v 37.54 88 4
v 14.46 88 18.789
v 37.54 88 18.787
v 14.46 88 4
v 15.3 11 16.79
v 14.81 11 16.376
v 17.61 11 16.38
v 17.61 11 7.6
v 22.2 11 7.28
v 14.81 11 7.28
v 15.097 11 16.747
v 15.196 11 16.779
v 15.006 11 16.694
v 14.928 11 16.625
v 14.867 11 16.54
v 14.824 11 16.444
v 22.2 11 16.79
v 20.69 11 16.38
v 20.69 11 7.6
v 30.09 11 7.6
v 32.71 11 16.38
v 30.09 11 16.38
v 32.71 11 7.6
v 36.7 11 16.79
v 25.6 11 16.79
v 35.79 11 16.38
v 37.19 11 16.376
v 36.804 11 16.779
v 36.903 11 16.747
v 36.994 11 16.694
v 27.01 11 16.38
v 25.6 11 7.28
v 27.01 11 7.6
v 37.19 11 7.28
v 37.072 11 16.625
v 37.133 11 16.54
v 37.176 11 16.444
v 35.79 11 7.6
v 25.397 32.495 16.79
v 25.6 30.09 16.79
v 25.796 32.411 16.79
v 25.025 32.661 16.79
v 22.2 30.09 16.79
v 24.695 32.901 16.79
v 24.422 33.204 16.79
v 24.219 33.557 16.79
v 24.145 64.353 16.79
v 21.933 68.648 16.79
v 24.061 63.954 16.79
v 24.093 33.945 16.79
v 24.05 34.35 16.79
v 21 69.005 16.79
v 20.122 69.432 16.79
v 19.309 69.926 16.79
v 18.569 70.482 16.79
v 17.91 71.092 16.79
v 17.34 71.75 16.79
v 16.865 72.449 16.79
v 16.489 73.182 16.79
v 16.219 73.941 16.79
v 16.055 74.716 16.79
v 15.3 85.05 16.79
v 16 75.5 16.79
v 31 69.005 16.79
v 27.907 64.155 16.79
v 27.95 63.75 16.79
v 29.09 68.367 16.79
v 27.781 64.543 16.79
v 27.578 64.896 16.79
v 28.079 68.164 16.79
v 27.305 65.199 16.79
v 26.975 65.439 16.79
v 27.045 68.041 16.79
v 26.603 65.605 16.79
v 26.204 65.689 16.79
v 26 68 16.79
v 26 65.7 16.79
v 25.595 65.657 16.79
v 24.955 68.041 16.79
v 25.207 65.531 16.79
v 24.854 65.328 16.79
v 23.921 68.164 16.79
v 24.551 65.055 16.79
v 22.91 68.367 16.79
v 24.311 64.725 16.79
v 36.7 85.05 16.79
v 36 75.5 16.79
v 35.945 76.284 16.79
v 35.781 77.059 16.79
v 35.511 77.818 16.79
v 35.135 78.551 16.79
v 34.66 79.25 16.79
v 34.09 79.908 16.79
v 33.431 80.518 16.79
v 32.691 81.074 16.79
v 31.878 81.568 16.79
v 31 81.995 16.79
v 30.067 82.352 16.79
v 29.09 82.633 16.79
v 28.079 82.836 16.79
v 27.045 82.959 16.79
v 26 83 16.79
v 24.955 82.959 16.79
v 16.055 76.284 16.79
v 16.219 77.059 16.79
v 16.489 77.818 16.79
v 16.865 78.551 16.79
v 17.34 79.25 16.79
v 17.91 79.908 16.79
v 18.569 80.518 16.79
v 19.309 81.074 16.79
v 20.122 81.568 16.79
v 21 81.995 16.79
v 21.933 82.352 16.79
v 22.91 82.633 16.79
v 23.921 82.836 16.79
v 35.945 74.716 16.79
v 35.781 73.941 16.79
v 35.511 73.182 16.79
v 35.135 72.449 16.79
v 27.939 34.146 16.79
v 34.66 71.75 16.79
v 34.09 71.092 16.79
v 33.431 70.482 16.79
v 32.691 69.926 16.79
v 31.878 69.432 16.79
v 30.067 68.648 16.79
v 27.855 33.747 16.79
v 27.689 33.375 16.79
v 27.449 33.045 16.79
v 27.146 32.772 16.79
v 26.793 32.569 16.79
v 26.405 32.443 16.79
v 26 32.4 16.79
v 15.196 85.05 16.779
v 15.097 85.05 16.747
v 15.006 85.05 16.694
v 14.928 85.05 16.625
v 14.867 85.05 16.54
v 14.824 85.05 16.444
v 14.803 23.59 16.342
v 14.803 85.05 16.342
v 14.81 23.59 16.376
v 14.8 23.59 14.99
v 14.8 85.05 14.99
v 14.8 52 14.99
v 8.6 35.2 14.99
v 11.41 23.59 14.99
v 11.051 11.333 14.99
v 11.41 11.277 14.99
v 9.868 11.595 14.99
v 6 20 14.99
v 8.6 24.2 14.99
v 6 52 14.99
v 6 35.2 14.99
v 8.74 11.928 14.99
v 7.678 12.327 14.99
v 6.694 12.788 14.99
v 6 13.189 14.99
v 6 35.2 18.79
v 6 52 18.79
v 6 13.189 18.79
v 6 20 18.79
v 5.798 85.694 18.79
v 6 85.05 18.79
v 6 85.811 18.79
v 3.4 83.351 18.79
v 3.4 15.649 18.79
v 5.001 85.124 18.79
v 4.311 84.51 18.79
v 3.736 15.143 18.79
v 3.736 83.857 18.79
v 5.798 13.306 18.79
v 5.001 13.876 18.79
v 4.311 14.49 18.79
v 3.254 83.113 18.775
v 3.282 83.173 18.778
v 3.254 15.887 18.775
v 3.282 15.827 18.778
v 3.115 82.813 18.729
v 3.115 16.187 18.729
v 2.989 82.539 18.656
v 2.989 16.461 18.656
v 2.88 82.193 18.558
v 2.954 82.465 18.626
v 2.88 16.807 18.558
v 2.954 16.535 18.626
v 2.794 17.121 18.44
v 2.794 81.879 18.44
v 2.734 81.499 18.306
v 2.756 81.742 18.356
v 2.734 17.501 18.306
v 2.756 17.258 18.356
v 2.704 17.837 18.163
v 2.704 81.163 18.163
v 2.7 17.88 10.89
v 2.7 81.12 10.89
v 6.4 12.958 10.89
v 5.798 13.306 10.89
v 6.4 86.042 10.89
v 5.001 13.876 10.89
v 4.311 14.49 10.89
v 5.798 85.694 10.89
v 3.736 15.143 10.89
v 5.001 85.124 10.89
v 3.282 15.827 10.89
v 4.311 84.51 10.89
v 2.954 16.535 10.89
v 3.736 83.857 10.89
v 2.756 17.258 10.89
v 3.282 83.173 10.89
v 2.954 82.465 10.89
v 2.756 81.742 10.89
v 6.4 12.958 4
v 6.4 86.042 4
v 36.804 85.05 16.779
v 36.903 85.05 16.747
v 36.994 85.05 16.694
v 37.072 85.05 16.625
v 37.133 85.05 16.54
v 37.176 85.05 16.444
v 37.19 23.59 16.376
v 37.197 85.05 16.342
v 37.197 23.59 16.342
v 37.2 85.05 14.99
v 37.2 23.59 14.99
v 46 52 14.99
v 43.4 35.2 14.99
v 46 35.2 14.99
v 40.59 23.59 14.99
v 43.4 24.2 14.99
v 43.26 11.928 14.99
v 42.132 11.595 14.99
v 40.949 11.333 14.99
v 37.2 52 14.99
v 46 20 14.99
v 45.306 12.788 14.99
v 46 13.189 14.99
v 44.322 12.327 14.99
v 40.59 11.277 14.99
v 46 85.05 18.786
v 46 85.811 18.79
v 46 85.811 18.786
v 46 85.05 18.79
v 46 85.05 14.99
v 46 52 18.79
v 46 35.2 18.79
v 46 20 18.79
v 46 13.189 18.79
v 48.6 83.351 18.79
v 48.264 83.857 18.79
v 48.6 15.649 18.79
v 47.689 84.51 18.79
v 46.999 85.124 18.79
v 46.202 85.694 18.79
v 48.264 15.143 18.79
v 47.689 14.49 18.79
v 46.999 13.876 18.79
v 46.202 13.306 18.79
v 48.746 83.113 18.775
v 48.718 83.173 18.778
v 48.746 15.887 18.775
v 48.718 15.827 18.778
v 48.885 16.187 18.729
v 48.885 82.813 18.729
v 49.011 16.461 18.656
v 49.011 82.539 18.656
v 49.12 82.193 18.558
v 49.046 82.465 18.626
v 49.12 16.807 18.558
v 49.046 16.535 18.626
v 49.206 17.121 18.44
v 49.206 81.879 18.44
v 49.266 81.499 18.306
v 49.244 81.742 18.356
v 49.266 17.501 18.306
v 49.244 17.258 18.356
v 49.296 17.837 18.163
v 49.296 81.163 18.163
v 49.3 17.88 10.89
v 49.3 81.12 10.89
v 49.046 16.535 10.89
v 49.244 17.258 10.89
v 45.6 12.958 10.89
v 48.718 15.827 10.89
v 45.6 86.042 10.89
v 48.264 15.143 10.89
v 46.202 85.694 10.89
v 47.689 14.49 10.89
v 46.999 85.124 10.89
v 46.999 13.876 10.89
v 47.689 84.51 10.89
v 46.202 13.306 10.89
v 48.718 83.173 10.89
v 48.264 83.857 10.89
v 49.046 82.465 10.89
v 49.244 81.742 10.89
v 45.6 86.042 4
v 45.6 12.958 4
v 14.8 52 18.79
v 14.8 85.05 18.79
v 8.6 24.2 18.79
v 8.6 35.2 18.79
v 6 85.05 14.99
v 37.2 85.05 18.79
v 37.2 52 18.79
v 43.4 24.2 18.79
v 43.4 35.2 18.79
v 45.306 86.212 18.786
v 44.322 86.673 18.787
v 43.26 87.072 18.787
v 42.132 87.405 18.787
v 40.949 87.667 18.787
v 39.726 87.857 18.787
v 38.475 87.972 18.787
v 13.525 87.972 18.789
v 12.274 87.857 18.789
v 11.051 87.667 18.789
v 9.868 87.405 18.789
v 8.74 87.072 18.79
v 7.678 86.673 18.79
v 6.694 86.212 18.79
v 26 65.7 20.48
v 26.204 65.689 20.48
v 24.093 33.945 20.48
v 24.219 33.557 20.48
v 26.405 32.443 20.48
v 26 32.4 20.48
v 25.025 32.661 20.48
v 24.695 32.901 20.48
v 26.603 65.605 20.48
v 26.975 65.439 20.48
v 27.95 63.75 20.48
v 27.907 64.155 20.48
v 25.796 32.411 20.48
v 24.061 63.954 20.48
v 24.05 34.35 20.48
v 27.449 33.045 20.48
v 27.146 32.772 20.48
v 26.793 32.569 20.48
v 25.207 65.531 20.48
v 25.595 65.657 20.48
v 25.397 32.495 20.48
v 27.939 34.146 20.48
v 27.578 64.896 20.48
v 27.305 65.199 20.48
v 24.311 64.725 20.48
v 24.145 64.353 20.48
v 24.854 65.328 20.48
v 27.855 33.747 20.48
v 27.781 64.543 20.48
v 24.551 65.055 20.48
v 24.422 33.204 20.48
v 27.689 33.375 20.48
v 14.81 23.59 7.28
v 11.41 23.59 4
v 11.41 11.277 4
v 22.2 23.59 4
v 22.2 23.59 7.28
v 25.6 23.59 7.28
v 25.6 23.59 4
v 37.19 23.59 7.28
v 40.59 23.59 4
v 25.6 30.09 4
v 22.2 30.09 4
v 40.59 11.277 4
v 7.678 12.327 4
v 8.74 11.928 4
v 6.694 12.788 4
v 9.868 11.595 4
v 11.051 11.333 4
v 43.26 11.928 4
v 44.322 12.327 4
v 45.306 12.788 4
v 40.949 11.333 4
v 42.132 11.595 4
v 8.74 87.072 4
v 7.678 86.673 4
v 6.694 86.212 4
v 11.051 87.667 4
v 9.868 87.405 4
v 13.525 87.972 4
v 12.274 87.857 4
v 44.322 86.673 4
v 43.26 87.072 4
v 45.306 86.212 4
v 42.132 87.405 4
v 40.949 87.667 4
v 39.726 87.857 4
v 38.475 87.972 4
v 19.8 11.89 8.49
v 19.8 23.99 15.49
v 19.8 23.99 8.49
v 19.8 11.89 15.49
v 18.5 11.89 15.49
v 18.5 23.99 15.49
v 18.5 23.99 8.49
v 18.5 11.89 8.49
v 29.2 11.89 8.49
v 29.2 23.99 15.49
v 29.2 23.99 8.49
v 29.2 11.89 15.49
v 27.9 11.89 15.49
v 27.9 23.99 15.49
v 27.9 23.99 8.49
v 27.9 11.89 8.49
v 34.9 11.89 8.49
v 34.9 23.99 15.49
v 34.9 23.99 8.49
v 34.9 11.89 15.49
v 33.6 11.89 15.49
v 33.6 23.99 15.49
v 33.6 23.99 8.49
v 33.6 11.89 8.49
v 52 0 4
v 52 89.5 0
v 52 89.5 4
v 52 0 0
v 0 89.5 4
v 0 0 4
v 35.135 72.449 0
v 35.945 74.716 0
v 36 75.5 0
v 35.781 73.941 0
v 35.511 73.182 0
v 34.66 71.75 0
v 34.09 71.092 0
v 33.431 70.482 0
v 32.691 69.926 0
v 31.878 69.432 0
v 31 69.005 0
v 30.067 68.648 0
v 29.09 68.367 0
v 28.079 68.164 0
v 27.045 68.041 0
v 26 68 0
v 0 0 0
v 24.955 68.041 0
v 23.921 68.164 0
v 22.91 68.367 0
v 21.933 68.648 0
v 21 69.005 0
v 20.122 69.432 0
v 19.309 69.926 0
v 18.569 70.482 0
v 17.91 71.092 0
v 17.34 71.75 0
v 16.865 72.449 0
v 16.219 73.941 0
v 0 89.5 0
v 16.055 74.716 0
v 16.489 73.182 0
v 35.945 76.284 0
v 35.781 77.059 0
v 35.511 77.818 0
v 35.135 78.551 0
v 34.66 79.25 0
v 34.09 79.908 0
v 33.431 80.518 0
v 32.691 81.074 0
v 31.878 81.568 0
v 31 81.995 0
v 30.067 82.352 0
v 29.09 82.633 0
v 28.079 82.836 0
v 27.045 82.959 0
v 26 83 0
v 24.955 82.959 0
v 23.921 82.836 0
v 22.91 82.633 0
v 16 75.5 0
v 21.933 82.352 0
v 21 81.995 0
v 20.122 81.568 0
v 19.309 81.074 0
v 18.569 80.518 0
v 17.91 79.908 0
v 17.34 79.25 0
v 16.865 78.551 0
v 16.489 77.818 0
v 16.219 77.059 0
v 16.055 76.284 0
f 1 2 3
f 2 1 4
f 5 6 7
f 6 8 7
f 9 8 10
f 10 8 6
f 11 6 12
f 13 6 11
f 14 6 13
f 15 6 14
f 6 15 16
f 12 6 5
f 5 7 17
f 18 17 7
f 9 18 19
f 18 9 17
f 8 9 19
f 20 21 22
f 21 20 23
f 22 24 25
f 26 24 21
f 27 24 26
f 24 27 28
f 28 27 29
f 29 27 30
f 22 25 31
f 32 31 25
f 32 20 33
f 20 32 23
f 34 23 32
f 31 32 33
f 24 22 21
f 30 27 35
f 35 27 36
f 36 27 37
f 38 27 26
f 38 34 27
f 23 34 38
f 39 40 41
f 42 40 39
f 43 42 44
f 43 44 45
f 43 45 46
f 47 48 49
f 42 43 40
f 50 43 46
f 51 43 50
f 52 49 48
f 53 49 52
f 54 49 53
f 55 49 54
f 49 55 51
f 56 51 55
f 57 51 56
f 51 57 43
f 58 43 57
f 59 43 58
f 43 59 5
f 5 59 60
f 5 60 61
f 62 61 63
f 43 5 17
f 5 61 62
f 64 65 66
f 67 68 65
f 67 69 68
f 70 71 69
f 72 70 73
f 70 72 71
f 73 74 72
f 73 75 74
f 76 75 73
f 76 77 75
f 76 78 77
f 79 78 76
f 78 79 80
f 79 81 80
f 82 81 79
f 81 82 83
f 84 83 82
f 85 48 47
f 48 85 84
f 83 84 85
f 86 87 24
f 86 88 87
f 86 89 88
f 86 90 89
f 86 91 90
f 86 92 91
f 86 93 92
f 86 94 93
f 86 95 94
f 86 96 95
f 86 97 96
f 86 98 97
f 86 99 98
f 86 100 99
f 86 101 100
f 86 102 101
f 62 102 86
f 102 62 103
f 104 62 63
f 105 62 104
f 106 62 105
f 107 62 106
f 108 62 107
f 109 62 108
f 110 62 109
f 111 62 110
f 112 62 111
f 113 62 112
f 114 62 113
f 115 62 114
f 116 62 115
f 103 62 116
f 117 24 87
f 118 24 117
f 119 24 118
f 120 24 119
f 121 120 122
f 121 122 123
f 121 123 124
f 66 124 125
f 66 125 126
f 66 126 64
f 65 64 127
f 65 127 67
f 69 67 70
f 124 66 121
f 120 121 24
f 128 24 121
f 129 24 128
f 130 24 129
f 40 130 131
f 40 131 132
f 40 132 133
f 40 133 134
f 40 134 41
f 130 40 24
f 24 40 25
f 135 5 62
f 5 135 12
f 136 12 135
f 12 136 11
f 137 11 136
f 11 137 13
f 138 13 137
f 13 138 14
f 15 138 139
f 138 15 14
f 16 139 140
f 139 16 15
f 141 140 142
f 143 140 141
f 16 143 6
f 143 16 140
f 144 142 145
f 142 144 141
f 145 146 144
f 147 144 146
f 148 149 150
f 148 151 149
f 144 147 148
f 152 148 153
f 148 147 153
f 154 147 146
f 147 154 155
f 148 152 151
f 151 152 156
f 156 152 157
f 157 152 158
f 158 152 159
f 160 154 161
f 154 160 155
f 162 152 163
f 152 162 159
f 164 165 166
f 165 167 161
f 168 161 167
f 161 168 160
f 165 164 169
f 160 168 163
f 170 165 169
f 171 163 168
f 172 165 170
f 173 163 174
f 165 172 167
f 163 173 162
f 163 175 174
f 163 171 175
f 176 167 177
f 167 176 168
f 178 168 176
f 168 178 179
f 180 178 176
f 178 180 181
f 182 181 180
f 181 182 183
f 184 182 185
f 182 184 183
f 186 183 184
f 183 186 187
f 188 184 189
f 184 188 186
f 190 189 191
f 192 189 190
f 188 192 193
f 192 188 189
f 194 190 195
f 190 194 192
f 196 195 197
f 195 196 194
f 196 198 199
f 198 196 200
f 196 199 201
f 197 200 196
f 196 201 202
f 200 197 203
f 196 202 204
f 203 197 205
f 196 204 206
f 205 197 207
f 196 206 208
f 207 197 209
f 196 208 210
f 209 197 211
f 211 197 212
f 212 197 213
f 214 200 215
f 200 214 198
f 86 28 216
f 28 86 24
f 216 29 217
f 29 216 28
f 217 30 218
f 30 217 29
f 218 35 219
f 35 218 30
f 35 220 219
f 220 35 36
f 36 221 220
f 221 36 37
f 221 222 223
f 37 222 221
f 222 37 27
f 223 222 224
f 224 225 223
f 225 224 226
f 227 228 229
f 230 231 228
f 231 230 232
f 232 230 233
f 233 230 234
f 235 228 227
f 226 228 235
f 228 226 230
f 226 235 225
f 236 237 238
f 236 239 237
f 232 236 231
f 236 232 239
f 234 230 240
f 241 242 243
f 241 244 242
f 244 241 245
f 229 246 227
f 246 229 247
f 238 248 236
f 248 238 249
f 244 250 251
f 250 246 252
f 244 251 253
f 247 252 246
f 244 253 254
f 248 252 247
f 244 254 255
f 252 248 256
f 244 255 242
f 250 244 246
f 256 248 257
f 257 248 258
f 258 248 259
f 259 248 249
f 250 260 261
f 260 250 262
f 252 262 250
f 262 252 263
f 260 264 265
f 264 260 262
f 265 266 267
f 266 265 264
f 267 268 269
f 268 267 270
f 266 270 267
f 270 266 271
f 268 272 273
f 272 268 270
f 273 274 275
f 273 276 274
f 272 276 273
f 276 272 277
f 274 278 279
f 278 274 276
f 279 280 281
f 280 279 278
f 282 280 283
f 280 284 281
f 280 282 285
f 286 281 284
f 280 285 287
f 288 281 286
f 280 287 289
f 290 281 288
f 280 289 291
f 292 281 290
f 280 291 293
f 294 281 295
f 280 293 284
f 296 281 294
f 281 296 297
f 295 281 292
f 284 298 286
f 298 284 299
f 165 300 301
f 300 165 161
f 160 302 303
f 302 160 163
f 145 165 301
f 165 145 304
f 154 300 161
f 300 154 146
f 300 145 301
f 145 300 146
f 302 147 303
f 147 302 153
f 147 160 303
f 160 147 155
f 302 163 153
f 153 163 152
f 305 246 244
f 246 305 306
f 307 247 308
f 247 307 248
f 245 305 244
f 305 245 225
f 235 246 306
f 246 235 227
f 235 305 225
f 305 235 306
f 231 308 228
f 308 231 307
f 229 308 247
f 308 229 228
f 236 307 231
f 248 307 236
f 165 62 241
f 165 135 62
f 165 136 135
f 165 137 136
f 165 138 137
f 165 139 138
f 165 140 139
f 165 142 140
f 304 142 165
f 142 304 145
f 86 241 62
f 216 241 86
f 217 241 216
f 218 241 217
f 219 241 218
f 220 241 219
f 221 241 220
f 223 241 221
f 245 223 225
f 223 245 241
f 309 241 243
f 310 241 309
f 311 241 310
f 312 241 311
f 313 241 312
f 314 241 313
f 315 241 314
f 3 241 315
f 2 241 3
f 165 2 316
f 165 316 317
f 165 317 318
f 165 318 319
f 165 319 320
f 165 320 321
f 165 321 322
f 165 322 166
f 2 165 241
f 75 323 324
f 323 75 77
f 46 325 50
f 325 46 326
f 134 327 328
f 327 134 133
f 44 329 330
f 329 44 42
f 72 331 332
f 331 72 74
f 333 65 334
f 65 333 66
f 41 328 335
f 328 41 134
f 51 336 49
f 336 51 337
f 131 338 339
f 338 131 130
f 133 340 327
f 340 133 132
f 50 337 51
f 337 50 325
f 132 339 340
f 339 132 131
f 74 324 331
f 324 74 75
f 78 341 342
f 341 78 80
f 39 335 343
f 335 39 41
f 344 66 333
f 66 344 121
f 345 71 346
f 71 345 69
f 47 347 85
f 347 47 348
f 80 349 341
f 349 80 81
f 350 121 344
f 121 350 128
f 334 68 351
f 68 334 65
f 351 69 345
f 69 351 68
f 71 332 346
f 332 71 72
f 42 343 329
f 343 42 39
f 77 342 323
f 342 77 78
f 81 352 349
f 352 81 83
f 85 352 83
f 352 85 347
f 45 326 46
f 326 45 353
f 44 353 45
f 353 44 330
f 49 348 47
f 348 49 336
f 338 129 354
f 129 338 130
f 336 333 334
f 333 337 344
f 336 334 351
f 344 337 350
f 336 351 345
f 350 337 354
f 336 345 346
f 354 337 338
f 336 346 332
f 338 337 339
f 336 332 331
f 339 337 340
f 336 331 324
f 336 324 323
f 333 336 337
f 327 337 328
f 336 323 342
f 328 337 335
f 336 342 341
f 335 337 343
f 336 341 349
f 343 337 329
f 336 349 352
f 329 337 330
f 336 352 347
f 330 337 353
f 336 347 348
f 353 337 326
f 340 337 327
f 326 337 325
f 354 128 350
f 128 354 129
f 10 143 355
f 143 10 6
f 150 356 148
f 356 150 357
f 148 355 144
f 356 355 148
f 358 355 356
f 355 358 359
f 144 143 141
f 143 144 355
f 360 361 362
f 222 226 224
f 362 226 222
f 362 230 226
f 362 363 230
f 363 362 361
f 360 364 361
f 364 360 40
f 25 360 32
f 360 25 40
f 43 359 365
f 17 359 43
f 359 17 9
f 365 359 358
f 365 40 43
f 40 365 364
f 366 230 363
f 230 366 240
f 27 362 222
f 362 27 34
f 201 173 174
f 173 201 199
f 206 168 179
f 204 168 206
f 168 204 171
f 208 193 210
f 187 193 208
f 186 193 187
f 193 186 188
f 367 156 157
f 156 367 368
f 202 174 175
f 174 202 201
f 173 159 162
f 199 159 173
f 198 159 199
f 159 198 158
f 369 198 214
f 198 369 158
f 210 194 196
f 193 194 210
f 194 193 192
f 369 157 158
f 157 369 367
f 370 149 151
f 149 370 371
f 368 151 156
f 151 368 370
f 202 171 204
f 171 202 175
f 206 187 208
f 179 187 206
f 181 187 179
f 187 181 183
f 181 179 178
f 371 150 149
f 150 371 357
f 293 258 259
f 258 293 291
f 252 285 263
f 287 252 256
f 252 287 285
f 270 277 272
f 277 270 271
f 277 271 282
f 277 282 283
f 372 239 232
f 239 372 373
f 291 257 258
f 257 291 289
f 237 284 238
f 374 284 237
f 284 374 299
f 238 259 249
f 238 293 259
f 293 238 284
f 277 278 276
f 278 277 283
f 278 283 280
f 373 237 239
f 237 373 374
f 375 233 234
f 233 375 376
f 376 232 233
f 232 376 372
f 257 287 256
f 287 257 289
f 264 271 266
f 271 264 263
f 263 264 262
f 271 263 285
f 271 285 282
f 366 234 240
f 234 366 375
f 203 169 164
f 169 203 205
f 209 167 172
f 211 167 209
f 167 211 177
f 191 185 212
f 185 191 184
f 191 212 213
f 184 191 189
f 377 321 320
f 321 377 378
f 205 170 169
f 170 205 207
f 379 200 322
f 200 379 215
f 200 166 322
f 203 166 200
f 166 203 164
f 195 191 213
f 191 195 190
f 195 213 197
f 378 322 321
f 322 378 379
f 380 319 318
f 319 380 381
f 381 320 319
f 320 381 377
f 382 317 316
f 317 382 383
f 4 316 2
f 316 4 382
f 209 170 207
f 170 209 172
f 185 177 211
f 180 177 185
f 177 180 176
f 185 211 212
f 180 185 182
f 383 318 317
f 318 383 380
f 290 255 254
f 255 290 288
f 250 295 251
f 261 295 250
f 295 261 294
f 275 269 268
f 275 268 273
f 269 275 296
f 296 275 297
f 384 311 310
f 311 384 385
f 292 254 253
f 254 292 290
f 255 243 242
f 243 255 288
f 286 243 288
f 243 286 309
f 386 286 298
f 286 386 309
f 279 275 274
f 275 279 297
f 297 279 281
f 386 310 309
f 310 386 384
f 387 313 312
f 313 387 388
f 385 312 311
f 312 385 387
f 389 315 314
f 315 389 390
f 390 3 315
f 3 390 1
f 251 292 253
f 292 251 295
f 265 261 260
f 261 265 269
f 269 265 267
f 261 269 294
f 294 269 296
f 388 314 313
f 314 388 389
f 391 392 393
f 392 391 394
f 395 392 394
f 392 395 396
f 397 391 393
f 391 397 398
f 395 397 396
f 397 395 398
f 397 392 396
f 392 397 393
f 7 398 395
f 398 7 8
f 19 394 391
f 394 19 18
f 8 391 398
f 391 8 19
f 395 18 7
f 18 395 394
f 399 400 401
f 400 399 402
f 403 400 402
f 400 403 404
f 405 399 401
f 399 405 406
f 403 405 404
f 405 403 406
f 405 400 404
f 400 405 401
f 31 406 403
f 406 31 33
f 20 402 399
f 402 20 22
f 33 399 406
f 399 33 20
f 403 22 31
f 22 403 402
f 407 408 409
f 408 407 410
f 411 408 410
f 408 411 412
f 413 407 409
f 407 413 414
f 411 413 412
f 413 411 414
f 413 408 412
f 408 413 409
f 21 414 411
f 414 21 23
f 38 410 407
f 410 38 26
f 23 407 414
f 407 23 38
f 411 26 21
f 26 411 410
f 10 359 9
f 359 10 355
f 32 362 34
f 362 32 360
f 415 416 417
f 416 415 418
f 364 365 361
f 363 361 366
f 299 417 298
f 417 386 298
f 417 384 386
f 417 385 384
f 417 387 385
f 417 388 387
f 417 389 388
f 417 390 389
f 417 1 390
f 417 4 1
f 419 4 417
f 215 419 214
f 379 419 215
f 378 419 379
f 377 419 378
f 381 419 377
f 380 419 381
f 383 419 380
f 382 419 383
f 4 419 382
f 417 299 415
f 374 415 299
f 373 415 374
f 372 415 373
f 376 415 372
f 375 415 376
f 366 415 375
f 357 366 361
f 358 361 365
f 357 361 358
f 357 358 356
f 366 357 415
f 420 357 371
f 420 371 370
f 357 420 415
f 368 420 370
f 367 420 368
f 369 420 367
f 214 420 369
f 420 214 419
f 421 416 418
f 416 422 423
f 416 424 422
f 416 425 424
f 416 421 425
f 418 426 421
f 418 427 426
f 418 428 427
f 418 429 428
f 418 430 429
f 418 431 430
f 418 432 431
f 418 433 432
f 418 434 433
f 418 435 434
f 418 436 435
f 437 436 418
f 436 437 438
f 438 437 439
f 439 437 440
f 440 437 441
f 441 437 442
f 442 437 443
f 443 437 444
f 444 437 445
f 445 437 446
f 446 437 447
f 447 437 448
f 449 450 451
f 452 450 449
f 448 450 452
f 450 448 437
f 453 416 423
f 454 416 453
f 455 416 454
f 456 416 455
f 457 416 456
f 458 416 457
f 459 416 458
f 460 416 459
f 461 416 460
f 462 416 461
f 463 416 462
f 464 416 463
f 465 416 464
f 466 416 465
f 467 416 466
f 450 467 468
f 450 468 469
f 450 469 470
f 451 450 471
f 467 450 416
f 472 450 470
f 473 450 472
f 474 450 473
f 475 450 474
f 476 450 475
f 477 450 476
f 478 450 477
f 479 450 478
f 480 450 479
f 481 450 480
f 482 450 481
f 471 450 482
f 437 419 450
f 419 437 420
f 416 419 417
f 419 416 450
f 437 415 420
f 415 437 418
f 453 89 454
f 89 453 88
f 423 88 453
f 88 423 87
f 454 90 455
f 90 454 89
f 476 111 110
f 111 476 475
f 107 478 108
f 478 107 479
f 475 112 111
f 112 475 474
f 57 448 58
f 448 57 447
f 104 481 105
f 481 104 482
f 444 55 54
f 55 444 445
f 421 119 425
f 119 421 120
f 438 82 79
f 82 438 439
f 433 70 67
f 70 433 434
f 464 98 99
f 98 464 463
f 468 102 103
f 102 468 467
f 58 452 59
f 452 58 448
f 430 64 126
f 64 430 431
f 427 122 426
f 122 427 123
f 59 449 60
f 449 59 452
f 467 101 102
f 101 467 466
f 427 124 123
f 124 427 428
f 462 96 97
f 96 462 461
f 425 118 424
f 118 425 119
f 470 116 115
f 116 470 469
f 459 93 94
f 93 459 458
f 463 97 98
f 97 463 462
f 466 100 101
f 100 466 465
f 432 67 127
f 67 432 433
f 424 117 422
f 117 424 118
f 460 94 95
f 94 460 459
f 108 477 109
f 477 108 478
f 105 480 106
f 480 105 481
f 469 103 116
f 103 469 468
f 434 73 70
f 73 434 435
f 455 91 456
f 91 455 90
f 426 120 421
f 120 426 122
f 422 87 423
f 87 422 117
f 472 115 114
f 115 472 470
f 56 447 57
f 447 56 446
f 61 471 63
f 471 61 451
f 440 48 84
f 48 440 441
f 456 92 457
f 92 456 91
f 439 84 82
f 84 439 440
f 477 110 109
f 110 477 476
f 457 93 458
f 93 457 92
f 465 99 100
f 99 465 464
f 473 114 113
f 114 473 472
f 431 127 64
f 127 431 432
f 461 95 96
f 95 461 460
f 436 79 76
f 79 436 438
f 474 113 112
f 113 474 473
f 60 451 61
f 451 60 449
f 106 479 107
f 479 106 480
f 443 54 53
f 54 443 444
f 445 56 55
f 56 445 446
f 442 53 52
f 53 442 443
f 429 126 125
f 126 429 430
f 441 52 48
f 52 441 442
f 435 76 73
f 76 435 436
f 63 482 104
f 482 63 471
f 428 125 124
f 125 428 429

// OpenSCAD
// file: openscad-reusables.scad
/** @file 
  * @brief A utility library of more generally useful functions, from the current directory.
  * @details It might make sense to outsource this library into its own project once 
  *   it is mature enough. The filename is already prepared for that case.
  *
  * @todo Rename "path" to something else to be compatible with the BOSL library, where paths are 
  *   simply ordered sets of 2D or 3D points. Perhaps "deltapath" or "dpath". Or even split 
  *   between "dpath" for a simple delta path without radii and "dxpath" for one with radii or 
  *   other extensions. BOSL has "2dpath" and "3dpath", even though their naming is a bit 
  *   inconsistent. See: https://github.com/revarbat/BOSL/wiki/paths.scad . So maybe:
  *   "deltapath2d", "deltapath3d", "xdeltapath2d", "xdeltapath3d".
  * @todo Contribute the functions related to delta paths to the BOSL library. See:
  *   https://github.com/revarbat/BOSL/wiki/paths.scad
  */


/** @brief Replacement for the "==" operator that ignores the imprecision of calculation with numbers in OpenSCAD, because all 
  *   numbers including literals like "10.1" are internally double precision reals. Useful in assert(), because otherwise 
  *   even something simple like assert(8.8 + 2.3 == 11.1) will not be asserted.
  * @param n1  First number to test for equality.
  * @param n2  Second number to test for equality.
  * @return true if the difference between the input numbers is less than 1×10¯¹⁰
  */
function equals(n1, n2) = (
    // echo("DEBUG: equals(): ", n1, " – ", n2, " = ", abs(n1 - n2)) // Enable for debugging
    abs(n1 - n2) < 1e-10
);


/** @brief Convert a relative path into an absolute path.
  * @detail A relative path is a vector starting with a corner [x, y, corner_radius] as the first element and having a series 
  *   of movements as the following elements. Each movement is an element [dx, dy, radius] of two deltas relative to the 
  *   previous path element and a corner radius at the target point of the movement. Paths can be interpreted as open paths or 
  *   (by assuming a last implicit movement back to the starting point) as closed paths / polygons. When interpreted as open 
  *   paths, the corner radius of the starting point has no meaning.
  *   When converting a relative path into an absolute path, the relative movements are resolved into absolute coordinates, but 
  *   the corner_radius spec is unchanged. So it is not a simple set of points afterwards, but still a path, as there can be 
  *   the corner_radius elements that specify curved sections.
  * @param path  A path. This is a vector starting with a point as first elements and having series of movements as the 
  *   following elements. Each movement is an element [dx, dy, radius] of two deltas relative to the previous path element 
  *   and a corner radius at the target point of the movement. Paths can be interpreted as open paths or (by assuming a 
  *   last implicit movement back to the starting point) as closed paths / polygons. When interpreted as open paths, the 
  *   corner radius of the starting point has no meaning.
  * @param last_index  An index into the path, pointing to the last element to process. Usually left out, in which case it 
  *   defaults to the highest possible index.
  * @todo Contribute this function to the Round Anything library.
  */
function abs_path(path, last_index) = (
    let(i = last_index == undef ? len(path) - 1 : last_index)
    
    // Recursion end case.
    i == 0 ? [path[0]] :
        
    // Recursion case.
    let(
        prev_points = abs_path(path, i - 1),
        prev_point = prev_points[i - 1]
    )
    concat(
        prev_points,
        [[ // A list of points with a single point inside.
            prev_point.x + path[i].x, 
            prev_point.y + path[i].y, 
            path[i][2]
        ]]
    )
);
assert(abs_path([[1,1,1], [2,2,2], [3,3,3]], 0) == [[1, 1, 1]],                       "abs_path() failed test 1");
assert(abs_path([[1,1,1], [2,2,2], [3,3,3]], 1) == [[1, 1, 1], [3, 3, 2]],            "abs_path() failed test 2");
assert(abs_path([[1,1,1], [2,2,2], [3,3,3]], 2) == [[1, 1, 1], [3, 3, 2], [6, 6, 3]], "abs_path() failed test 3");
assert(abs_path([[1,1,1], [2,2,2], [3,3,3]]   ) == [[1, 1, 1], [3, 3, 2], [6, 6, 3]], "abs_path() failed test 4");


/** @brief Shorthand function to create the points of a rounded polygon from a path. This enables to call 
  *   "polygon(polygon_points(left_lockblock_path))".
  * @param path  A path. This is a vector starting with a point as first elements and having series of movements as the 
  *   following elements. Each movement is an element [dx, dy, radius] of two deltas relative to the previous path element 
  *   and a corner radius at the target point of the movement.
  * @param fn  The number of curve fragments to generate for each radius. Optional; the default value is $fr of the current 
  *   context.
  * @return A vector of points [x, y] that can, for example, be handed to polygon().
  * @todo Remove the fn parameter. Instead use $fr or (if all radii are ≤2 mm) $frs. This is more in line with the usage 
  *   of $fa, which is for a similar purpose. Even better, calculate an approximate $fr equivalent here locally from the 
  *   $fa and $fs special variables, which gets rid of the need for the $fr and $frs special variables.
  */
function polygon_points(path, fn = $fr) = (
    polyRound(abs_path(path), fn)
);


/** @brief Shorthand module to create a rounded polygon from a path.
  * @param path  A path. This is a vector starting with a point as first elements and having series of movements as the 
  *   following elements. Each movement is an element [dx, dy, radius] of two deltas relative to the previous path element 
  *   and a corner radius at the target point of the movement.
  * @param fn  The number of curve fragments to generate for each radius. Optional; the default value is $fr of the current 
  *   context.
  */
module rounded_polygon(path, fn = $fr) {
    polygon(polygon_points(path, fn));
}


/** @brief A fillet in the first octant, with the 90° angle along the axis.
  * @param w  Width (x axis extension) of the fillet. This is the first radius to define the asymmetrical fillet.
  * @param d  Depth (y axis extension) of the fillet. This is the second radius to define the asymmetrical fillet.
  * @param d  Height (z axis extension) of the fillet.
  */
module asymmetrical_fillet(w, d, h) {
    difference() {
        cube([w, d, h]);
        
        translate([w, d, 0])
            scale([1, d / w, 1])
                cylinder(h = h, r = w);
    }
}


/** Calculates the length of the tip cut off by adding a radius to a corner. */
function radius_cutoff(angle, r) = (
    let(
        // Source: Round-Anything API docs, at "See bellow for an even deeper dive", see 
        // https://kurthutten.com/blog/round-anything-api/
        tangent_length = r / tan(angle / 2),

        // Now we have a SAS triangle made from tangent_length an r, with a 90° angle 
        // between them. That lets us calculate the third side, which is the distance 
        // between the circle's center and the tip that is being cut off. Formula (with simplification for a 90° angle):
        // https://en.wikipedia.org/wiki/Solution_of_triangles#Two_sides_and_the_included_angle_given_(SAS)
        center_to_tip = sqrt(pow(r, 2) + pow(tangent_length, 2)),

        radius_cutoff = center_to_tip - r
    )
    radius_cutoff
);
// main file
/** @file 
  * @brief Blind plate for Milwaukee M28 batteries to protect the terminals against accidental 
  *   short-circuiting in transport.
  */

// Up here to appear before any assert() and echo() in the parameters section.
echo("\n\n============ NEXT RUN ============");


// (1) INCLUDES
// ======================================================================
// Local includes from the current directory are indicated by a "./…" path.

// Round Anything library from https://github.com/Irev-Dev/Round-Anything/
include <Round-Anything/polyround.scad>

// A utility library of more generally useful functions.
include <./openscad-reusables.scad>

// Central registry for all M28 system related part dimensions.
include <./measures.scad>

// Battery socket, used as the base design for this design.
use <./m28-socket.scad>


// (2) CUSTOMIZER PARAMETERS
// ======================================================================

// Degree of details in the output. Influences segments per degree, filleting quality etc..
quality = "preview"; // ["fast preview", "preview", "rendering", "final rendering"]


// (3) FIXED AND DERIVED MEASURES
// ======================================================================

// Prevent anything following from showing up as Customizer parameters.
/* [Hidden] */

// Degrees per fragment of a circle.
$fa =   
    (quality == "final rendering") ? 1 :
    (quality == "rendering") ? 3 : 
    (quality == "preview") ? 6 :
    (quality == "fast preview") ? 12 : 12; // The OpenSCAD default.
      
// Minimum size of circle fragments.
$fs = 
    (quality == "final rendering") ? 0.1 :
    (quality == "rendering") ? 0.25 : 
    (quality == "preview") ? 0.5 :
    (quality == "fast preview") ? 2 : 2; // The OpenSCAD default.
     
// Fragment count in a radius or fillet element. Simply assumes that an average radius or fillet is 90°.
$fr = 360 / $fa / 4;

// Fragment count in a small (≤2 mm) radius or fillet element. Simply assumes that an average radius or fillet is 90°.
$frs = $fr / 2;

// The default part context for m() calls. Can be overridden via m(part = "…", "…").
$part = "isolator";

// Small amount of overlap for unions and differences, to prevent z-fighting.
nothing = 0.01;


// (4) PARTS
// ======================================================================

/** @brief Blind socket insert to protect the terminals of Milwaukee M28 batteries. 
  *    This is the main object of this file. */
module m28_isolator() {

    /** @brief A cover plate for the top of the battery. 
      * @todo Let the cover end flush with the m28_socket().
      * @todo Give it rounded corners and edges.
      * @todo Perhaps make the cover larger, to allow more secure stacking of batteries.
      * @todo Perhaps add stacking corners or stacking ridges to the cover, to enable more secure 
      *   battery stacking. This could also be another variant of the isolator, guided by a 
      *   Customizer parameter.
      */
    module cover() {
        let($part = "device")
            cube([m("base w"), m("base d"), m(part = "isolator", "cover h")]);
    }


    /** @brief A hole to remove the battery isolator with one finger. For good printability, this 
      *   is a throughhole.
      * @todo Make the hole a 18 × 12 mm ellipse, as that is large enough for a finger.
      * @todo Add 45° chamfers to both ends of the hole. Use the BOSL cyl() shape for this. */
    module finger_hole() {
        h = m(part = "isolator", "cover h") + m(part = "socket", "middle section h");
        translate([m(part = "device", "base w") / 2, m(part = "device", "base d") - 14 , 0])
            scale([10/7.5, 1, 1])
                cylinder(r = 7.5, h = h + 2 * nothing);
    }


    // m28_isolator() implementation.
    difference() {
        union() {
            let($part = "device")
                translate([m("side overhang w"), m("front overhang d"), m(part = "isolator", "cover h") - nothing])
                    // @todo Shorten the ridge, as it interferes with the throughhole, and only the 
                    //   front part is necessary as a guide here since the isolator is only one-sided.
                    // @todo Generate the socket in a more printer-friendly manner, once that is implemented.
                    m28_socket();

            color("Chocolate")  cover();
        }
        translate([0, 0, -nothing]) {
            finger_hole();
        }
    }
}


// (5) SCENE
// ======================================================================

// Entry point of geometry generation.
//
// A final union() guarantees printable, non-intersecting geometries even when the lazy unions 
// feature is no longer experimental and also applied to user modules (not the case as of version 
// 2020.09.18). See: http://forum.openscad.org/-tp27991.html .
if (quality == "final rendering")
    union()
        m28_isolator();
else
    m28_isolator();
